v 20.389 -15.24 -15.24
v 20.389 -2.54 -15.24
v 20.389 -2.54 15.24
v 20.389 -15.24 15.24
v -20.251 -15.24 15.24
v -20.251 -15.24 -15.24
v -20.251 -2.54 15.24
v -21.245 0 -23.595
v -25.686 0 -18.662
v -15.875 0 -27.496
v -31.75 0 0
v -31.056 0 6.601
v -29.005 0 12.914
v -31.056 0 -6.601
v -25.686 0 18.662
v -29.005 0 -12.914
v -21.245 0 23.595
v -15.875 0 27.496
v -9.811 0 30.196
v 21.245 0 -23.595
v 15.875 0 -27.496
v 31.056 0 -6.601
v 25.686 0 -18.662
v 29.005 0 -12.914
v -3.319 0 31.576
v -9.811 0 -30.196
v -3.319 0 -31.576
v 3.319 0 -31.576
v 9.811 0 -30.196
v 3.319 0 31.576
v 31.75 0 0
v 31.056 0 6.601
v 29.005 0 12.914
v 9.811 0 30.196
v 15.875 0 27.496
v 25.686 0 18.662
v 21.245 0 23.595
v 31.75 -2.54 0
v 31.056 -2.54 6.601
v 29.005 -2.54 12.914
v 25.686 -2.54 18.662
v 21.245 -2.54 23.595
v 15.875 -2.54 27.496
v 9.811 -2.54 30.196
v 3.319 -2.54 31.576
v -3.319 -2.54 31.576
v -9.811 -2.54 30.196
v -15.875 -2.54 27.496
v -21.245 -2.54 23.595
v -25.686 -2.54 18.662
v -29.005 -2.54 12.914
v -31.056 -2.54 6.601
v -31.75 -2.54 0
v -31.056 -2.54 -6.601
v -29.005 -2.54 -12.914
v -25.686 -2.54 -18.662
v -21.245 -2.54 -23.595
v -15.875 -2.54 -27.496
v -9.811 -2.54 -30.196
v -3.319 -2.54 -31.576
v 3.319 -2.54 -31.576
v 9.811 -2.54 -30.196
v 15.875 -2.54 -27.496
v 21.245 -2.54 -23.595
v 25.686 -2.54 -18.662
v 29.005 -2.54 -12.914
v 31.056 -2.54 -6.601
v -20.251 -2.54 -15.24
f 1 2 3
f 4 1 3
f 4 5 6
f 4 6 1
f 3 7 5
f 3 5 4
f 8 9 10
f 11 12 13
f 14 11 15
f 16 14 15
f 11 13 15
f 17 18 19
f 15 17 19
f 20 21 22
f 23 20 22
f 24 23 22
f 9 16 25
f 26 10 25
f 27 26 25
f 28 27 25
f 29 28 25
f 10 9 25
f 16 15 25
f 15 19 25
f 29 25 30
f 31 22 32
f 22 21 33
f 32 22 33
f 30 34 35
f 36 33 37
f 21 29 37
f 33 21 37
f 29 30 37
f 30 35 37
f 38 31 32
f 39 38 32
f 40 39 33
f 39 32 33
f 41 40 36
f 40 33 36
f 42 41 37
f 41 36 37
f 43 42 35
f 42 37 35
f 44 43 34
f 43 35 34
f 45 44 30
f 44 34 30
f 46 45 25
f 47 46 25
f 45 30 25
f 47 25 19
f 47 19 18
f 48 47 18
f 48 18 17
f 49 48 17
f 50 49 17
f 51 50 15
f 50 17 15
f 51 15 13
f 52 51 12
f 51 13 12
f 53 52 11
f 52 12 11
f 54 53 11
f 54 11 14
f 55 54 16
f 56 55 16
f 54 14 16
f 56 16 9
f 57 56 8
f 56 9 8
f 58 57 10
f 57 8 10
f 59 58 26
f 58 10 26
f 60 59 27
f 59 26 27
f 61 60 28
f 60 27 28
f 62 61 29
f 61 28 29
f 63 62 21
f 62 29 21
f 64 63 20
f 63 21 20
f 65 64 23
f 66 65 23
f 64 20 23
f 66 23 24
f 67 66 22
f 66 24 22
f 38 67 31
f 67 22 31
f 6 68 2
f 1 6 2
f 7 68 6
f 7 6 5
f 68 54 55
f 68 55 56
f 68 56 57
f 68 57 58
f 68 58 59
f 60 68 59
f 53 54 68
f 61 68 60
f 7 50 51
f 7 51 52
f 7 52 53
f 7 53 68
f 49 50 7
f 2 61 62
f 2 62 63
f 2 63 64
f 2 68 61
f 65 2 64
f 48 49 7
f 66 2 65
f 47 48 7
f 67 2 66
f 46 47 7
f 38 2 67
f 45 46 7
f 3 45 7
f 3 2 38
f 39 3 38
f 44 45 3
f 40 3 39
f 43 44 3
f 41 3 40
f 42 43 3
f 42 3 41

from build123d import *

# Parameters (mm, degrees)
F0_R     = 31.75
F0_W     = 40.64
F0_H     = 30.48
F1_DEPTH = 2.54
F2_DEPTH = 15.24


with BuildPart() as f1:
    # F0 (on Front) → F1 (new body)
    with BuildSketch(Plane.XZ):
        Circle(F0_R)
        with Locations((0.068977, 0)):
            Rectangle(F0_W, F0_H, mode=Mode.SUBTRACT)
    extrude(amount=F1_DEPTH)

    # F0 (on Front) → F2 (join)
    with BuildSketch(Plane.XZ):
        with Locations((0.068977, 0)):
            Rectangle(F0_W, F0_H)
    extrude(amount=F2_DEPTH)


solid = f1.part
